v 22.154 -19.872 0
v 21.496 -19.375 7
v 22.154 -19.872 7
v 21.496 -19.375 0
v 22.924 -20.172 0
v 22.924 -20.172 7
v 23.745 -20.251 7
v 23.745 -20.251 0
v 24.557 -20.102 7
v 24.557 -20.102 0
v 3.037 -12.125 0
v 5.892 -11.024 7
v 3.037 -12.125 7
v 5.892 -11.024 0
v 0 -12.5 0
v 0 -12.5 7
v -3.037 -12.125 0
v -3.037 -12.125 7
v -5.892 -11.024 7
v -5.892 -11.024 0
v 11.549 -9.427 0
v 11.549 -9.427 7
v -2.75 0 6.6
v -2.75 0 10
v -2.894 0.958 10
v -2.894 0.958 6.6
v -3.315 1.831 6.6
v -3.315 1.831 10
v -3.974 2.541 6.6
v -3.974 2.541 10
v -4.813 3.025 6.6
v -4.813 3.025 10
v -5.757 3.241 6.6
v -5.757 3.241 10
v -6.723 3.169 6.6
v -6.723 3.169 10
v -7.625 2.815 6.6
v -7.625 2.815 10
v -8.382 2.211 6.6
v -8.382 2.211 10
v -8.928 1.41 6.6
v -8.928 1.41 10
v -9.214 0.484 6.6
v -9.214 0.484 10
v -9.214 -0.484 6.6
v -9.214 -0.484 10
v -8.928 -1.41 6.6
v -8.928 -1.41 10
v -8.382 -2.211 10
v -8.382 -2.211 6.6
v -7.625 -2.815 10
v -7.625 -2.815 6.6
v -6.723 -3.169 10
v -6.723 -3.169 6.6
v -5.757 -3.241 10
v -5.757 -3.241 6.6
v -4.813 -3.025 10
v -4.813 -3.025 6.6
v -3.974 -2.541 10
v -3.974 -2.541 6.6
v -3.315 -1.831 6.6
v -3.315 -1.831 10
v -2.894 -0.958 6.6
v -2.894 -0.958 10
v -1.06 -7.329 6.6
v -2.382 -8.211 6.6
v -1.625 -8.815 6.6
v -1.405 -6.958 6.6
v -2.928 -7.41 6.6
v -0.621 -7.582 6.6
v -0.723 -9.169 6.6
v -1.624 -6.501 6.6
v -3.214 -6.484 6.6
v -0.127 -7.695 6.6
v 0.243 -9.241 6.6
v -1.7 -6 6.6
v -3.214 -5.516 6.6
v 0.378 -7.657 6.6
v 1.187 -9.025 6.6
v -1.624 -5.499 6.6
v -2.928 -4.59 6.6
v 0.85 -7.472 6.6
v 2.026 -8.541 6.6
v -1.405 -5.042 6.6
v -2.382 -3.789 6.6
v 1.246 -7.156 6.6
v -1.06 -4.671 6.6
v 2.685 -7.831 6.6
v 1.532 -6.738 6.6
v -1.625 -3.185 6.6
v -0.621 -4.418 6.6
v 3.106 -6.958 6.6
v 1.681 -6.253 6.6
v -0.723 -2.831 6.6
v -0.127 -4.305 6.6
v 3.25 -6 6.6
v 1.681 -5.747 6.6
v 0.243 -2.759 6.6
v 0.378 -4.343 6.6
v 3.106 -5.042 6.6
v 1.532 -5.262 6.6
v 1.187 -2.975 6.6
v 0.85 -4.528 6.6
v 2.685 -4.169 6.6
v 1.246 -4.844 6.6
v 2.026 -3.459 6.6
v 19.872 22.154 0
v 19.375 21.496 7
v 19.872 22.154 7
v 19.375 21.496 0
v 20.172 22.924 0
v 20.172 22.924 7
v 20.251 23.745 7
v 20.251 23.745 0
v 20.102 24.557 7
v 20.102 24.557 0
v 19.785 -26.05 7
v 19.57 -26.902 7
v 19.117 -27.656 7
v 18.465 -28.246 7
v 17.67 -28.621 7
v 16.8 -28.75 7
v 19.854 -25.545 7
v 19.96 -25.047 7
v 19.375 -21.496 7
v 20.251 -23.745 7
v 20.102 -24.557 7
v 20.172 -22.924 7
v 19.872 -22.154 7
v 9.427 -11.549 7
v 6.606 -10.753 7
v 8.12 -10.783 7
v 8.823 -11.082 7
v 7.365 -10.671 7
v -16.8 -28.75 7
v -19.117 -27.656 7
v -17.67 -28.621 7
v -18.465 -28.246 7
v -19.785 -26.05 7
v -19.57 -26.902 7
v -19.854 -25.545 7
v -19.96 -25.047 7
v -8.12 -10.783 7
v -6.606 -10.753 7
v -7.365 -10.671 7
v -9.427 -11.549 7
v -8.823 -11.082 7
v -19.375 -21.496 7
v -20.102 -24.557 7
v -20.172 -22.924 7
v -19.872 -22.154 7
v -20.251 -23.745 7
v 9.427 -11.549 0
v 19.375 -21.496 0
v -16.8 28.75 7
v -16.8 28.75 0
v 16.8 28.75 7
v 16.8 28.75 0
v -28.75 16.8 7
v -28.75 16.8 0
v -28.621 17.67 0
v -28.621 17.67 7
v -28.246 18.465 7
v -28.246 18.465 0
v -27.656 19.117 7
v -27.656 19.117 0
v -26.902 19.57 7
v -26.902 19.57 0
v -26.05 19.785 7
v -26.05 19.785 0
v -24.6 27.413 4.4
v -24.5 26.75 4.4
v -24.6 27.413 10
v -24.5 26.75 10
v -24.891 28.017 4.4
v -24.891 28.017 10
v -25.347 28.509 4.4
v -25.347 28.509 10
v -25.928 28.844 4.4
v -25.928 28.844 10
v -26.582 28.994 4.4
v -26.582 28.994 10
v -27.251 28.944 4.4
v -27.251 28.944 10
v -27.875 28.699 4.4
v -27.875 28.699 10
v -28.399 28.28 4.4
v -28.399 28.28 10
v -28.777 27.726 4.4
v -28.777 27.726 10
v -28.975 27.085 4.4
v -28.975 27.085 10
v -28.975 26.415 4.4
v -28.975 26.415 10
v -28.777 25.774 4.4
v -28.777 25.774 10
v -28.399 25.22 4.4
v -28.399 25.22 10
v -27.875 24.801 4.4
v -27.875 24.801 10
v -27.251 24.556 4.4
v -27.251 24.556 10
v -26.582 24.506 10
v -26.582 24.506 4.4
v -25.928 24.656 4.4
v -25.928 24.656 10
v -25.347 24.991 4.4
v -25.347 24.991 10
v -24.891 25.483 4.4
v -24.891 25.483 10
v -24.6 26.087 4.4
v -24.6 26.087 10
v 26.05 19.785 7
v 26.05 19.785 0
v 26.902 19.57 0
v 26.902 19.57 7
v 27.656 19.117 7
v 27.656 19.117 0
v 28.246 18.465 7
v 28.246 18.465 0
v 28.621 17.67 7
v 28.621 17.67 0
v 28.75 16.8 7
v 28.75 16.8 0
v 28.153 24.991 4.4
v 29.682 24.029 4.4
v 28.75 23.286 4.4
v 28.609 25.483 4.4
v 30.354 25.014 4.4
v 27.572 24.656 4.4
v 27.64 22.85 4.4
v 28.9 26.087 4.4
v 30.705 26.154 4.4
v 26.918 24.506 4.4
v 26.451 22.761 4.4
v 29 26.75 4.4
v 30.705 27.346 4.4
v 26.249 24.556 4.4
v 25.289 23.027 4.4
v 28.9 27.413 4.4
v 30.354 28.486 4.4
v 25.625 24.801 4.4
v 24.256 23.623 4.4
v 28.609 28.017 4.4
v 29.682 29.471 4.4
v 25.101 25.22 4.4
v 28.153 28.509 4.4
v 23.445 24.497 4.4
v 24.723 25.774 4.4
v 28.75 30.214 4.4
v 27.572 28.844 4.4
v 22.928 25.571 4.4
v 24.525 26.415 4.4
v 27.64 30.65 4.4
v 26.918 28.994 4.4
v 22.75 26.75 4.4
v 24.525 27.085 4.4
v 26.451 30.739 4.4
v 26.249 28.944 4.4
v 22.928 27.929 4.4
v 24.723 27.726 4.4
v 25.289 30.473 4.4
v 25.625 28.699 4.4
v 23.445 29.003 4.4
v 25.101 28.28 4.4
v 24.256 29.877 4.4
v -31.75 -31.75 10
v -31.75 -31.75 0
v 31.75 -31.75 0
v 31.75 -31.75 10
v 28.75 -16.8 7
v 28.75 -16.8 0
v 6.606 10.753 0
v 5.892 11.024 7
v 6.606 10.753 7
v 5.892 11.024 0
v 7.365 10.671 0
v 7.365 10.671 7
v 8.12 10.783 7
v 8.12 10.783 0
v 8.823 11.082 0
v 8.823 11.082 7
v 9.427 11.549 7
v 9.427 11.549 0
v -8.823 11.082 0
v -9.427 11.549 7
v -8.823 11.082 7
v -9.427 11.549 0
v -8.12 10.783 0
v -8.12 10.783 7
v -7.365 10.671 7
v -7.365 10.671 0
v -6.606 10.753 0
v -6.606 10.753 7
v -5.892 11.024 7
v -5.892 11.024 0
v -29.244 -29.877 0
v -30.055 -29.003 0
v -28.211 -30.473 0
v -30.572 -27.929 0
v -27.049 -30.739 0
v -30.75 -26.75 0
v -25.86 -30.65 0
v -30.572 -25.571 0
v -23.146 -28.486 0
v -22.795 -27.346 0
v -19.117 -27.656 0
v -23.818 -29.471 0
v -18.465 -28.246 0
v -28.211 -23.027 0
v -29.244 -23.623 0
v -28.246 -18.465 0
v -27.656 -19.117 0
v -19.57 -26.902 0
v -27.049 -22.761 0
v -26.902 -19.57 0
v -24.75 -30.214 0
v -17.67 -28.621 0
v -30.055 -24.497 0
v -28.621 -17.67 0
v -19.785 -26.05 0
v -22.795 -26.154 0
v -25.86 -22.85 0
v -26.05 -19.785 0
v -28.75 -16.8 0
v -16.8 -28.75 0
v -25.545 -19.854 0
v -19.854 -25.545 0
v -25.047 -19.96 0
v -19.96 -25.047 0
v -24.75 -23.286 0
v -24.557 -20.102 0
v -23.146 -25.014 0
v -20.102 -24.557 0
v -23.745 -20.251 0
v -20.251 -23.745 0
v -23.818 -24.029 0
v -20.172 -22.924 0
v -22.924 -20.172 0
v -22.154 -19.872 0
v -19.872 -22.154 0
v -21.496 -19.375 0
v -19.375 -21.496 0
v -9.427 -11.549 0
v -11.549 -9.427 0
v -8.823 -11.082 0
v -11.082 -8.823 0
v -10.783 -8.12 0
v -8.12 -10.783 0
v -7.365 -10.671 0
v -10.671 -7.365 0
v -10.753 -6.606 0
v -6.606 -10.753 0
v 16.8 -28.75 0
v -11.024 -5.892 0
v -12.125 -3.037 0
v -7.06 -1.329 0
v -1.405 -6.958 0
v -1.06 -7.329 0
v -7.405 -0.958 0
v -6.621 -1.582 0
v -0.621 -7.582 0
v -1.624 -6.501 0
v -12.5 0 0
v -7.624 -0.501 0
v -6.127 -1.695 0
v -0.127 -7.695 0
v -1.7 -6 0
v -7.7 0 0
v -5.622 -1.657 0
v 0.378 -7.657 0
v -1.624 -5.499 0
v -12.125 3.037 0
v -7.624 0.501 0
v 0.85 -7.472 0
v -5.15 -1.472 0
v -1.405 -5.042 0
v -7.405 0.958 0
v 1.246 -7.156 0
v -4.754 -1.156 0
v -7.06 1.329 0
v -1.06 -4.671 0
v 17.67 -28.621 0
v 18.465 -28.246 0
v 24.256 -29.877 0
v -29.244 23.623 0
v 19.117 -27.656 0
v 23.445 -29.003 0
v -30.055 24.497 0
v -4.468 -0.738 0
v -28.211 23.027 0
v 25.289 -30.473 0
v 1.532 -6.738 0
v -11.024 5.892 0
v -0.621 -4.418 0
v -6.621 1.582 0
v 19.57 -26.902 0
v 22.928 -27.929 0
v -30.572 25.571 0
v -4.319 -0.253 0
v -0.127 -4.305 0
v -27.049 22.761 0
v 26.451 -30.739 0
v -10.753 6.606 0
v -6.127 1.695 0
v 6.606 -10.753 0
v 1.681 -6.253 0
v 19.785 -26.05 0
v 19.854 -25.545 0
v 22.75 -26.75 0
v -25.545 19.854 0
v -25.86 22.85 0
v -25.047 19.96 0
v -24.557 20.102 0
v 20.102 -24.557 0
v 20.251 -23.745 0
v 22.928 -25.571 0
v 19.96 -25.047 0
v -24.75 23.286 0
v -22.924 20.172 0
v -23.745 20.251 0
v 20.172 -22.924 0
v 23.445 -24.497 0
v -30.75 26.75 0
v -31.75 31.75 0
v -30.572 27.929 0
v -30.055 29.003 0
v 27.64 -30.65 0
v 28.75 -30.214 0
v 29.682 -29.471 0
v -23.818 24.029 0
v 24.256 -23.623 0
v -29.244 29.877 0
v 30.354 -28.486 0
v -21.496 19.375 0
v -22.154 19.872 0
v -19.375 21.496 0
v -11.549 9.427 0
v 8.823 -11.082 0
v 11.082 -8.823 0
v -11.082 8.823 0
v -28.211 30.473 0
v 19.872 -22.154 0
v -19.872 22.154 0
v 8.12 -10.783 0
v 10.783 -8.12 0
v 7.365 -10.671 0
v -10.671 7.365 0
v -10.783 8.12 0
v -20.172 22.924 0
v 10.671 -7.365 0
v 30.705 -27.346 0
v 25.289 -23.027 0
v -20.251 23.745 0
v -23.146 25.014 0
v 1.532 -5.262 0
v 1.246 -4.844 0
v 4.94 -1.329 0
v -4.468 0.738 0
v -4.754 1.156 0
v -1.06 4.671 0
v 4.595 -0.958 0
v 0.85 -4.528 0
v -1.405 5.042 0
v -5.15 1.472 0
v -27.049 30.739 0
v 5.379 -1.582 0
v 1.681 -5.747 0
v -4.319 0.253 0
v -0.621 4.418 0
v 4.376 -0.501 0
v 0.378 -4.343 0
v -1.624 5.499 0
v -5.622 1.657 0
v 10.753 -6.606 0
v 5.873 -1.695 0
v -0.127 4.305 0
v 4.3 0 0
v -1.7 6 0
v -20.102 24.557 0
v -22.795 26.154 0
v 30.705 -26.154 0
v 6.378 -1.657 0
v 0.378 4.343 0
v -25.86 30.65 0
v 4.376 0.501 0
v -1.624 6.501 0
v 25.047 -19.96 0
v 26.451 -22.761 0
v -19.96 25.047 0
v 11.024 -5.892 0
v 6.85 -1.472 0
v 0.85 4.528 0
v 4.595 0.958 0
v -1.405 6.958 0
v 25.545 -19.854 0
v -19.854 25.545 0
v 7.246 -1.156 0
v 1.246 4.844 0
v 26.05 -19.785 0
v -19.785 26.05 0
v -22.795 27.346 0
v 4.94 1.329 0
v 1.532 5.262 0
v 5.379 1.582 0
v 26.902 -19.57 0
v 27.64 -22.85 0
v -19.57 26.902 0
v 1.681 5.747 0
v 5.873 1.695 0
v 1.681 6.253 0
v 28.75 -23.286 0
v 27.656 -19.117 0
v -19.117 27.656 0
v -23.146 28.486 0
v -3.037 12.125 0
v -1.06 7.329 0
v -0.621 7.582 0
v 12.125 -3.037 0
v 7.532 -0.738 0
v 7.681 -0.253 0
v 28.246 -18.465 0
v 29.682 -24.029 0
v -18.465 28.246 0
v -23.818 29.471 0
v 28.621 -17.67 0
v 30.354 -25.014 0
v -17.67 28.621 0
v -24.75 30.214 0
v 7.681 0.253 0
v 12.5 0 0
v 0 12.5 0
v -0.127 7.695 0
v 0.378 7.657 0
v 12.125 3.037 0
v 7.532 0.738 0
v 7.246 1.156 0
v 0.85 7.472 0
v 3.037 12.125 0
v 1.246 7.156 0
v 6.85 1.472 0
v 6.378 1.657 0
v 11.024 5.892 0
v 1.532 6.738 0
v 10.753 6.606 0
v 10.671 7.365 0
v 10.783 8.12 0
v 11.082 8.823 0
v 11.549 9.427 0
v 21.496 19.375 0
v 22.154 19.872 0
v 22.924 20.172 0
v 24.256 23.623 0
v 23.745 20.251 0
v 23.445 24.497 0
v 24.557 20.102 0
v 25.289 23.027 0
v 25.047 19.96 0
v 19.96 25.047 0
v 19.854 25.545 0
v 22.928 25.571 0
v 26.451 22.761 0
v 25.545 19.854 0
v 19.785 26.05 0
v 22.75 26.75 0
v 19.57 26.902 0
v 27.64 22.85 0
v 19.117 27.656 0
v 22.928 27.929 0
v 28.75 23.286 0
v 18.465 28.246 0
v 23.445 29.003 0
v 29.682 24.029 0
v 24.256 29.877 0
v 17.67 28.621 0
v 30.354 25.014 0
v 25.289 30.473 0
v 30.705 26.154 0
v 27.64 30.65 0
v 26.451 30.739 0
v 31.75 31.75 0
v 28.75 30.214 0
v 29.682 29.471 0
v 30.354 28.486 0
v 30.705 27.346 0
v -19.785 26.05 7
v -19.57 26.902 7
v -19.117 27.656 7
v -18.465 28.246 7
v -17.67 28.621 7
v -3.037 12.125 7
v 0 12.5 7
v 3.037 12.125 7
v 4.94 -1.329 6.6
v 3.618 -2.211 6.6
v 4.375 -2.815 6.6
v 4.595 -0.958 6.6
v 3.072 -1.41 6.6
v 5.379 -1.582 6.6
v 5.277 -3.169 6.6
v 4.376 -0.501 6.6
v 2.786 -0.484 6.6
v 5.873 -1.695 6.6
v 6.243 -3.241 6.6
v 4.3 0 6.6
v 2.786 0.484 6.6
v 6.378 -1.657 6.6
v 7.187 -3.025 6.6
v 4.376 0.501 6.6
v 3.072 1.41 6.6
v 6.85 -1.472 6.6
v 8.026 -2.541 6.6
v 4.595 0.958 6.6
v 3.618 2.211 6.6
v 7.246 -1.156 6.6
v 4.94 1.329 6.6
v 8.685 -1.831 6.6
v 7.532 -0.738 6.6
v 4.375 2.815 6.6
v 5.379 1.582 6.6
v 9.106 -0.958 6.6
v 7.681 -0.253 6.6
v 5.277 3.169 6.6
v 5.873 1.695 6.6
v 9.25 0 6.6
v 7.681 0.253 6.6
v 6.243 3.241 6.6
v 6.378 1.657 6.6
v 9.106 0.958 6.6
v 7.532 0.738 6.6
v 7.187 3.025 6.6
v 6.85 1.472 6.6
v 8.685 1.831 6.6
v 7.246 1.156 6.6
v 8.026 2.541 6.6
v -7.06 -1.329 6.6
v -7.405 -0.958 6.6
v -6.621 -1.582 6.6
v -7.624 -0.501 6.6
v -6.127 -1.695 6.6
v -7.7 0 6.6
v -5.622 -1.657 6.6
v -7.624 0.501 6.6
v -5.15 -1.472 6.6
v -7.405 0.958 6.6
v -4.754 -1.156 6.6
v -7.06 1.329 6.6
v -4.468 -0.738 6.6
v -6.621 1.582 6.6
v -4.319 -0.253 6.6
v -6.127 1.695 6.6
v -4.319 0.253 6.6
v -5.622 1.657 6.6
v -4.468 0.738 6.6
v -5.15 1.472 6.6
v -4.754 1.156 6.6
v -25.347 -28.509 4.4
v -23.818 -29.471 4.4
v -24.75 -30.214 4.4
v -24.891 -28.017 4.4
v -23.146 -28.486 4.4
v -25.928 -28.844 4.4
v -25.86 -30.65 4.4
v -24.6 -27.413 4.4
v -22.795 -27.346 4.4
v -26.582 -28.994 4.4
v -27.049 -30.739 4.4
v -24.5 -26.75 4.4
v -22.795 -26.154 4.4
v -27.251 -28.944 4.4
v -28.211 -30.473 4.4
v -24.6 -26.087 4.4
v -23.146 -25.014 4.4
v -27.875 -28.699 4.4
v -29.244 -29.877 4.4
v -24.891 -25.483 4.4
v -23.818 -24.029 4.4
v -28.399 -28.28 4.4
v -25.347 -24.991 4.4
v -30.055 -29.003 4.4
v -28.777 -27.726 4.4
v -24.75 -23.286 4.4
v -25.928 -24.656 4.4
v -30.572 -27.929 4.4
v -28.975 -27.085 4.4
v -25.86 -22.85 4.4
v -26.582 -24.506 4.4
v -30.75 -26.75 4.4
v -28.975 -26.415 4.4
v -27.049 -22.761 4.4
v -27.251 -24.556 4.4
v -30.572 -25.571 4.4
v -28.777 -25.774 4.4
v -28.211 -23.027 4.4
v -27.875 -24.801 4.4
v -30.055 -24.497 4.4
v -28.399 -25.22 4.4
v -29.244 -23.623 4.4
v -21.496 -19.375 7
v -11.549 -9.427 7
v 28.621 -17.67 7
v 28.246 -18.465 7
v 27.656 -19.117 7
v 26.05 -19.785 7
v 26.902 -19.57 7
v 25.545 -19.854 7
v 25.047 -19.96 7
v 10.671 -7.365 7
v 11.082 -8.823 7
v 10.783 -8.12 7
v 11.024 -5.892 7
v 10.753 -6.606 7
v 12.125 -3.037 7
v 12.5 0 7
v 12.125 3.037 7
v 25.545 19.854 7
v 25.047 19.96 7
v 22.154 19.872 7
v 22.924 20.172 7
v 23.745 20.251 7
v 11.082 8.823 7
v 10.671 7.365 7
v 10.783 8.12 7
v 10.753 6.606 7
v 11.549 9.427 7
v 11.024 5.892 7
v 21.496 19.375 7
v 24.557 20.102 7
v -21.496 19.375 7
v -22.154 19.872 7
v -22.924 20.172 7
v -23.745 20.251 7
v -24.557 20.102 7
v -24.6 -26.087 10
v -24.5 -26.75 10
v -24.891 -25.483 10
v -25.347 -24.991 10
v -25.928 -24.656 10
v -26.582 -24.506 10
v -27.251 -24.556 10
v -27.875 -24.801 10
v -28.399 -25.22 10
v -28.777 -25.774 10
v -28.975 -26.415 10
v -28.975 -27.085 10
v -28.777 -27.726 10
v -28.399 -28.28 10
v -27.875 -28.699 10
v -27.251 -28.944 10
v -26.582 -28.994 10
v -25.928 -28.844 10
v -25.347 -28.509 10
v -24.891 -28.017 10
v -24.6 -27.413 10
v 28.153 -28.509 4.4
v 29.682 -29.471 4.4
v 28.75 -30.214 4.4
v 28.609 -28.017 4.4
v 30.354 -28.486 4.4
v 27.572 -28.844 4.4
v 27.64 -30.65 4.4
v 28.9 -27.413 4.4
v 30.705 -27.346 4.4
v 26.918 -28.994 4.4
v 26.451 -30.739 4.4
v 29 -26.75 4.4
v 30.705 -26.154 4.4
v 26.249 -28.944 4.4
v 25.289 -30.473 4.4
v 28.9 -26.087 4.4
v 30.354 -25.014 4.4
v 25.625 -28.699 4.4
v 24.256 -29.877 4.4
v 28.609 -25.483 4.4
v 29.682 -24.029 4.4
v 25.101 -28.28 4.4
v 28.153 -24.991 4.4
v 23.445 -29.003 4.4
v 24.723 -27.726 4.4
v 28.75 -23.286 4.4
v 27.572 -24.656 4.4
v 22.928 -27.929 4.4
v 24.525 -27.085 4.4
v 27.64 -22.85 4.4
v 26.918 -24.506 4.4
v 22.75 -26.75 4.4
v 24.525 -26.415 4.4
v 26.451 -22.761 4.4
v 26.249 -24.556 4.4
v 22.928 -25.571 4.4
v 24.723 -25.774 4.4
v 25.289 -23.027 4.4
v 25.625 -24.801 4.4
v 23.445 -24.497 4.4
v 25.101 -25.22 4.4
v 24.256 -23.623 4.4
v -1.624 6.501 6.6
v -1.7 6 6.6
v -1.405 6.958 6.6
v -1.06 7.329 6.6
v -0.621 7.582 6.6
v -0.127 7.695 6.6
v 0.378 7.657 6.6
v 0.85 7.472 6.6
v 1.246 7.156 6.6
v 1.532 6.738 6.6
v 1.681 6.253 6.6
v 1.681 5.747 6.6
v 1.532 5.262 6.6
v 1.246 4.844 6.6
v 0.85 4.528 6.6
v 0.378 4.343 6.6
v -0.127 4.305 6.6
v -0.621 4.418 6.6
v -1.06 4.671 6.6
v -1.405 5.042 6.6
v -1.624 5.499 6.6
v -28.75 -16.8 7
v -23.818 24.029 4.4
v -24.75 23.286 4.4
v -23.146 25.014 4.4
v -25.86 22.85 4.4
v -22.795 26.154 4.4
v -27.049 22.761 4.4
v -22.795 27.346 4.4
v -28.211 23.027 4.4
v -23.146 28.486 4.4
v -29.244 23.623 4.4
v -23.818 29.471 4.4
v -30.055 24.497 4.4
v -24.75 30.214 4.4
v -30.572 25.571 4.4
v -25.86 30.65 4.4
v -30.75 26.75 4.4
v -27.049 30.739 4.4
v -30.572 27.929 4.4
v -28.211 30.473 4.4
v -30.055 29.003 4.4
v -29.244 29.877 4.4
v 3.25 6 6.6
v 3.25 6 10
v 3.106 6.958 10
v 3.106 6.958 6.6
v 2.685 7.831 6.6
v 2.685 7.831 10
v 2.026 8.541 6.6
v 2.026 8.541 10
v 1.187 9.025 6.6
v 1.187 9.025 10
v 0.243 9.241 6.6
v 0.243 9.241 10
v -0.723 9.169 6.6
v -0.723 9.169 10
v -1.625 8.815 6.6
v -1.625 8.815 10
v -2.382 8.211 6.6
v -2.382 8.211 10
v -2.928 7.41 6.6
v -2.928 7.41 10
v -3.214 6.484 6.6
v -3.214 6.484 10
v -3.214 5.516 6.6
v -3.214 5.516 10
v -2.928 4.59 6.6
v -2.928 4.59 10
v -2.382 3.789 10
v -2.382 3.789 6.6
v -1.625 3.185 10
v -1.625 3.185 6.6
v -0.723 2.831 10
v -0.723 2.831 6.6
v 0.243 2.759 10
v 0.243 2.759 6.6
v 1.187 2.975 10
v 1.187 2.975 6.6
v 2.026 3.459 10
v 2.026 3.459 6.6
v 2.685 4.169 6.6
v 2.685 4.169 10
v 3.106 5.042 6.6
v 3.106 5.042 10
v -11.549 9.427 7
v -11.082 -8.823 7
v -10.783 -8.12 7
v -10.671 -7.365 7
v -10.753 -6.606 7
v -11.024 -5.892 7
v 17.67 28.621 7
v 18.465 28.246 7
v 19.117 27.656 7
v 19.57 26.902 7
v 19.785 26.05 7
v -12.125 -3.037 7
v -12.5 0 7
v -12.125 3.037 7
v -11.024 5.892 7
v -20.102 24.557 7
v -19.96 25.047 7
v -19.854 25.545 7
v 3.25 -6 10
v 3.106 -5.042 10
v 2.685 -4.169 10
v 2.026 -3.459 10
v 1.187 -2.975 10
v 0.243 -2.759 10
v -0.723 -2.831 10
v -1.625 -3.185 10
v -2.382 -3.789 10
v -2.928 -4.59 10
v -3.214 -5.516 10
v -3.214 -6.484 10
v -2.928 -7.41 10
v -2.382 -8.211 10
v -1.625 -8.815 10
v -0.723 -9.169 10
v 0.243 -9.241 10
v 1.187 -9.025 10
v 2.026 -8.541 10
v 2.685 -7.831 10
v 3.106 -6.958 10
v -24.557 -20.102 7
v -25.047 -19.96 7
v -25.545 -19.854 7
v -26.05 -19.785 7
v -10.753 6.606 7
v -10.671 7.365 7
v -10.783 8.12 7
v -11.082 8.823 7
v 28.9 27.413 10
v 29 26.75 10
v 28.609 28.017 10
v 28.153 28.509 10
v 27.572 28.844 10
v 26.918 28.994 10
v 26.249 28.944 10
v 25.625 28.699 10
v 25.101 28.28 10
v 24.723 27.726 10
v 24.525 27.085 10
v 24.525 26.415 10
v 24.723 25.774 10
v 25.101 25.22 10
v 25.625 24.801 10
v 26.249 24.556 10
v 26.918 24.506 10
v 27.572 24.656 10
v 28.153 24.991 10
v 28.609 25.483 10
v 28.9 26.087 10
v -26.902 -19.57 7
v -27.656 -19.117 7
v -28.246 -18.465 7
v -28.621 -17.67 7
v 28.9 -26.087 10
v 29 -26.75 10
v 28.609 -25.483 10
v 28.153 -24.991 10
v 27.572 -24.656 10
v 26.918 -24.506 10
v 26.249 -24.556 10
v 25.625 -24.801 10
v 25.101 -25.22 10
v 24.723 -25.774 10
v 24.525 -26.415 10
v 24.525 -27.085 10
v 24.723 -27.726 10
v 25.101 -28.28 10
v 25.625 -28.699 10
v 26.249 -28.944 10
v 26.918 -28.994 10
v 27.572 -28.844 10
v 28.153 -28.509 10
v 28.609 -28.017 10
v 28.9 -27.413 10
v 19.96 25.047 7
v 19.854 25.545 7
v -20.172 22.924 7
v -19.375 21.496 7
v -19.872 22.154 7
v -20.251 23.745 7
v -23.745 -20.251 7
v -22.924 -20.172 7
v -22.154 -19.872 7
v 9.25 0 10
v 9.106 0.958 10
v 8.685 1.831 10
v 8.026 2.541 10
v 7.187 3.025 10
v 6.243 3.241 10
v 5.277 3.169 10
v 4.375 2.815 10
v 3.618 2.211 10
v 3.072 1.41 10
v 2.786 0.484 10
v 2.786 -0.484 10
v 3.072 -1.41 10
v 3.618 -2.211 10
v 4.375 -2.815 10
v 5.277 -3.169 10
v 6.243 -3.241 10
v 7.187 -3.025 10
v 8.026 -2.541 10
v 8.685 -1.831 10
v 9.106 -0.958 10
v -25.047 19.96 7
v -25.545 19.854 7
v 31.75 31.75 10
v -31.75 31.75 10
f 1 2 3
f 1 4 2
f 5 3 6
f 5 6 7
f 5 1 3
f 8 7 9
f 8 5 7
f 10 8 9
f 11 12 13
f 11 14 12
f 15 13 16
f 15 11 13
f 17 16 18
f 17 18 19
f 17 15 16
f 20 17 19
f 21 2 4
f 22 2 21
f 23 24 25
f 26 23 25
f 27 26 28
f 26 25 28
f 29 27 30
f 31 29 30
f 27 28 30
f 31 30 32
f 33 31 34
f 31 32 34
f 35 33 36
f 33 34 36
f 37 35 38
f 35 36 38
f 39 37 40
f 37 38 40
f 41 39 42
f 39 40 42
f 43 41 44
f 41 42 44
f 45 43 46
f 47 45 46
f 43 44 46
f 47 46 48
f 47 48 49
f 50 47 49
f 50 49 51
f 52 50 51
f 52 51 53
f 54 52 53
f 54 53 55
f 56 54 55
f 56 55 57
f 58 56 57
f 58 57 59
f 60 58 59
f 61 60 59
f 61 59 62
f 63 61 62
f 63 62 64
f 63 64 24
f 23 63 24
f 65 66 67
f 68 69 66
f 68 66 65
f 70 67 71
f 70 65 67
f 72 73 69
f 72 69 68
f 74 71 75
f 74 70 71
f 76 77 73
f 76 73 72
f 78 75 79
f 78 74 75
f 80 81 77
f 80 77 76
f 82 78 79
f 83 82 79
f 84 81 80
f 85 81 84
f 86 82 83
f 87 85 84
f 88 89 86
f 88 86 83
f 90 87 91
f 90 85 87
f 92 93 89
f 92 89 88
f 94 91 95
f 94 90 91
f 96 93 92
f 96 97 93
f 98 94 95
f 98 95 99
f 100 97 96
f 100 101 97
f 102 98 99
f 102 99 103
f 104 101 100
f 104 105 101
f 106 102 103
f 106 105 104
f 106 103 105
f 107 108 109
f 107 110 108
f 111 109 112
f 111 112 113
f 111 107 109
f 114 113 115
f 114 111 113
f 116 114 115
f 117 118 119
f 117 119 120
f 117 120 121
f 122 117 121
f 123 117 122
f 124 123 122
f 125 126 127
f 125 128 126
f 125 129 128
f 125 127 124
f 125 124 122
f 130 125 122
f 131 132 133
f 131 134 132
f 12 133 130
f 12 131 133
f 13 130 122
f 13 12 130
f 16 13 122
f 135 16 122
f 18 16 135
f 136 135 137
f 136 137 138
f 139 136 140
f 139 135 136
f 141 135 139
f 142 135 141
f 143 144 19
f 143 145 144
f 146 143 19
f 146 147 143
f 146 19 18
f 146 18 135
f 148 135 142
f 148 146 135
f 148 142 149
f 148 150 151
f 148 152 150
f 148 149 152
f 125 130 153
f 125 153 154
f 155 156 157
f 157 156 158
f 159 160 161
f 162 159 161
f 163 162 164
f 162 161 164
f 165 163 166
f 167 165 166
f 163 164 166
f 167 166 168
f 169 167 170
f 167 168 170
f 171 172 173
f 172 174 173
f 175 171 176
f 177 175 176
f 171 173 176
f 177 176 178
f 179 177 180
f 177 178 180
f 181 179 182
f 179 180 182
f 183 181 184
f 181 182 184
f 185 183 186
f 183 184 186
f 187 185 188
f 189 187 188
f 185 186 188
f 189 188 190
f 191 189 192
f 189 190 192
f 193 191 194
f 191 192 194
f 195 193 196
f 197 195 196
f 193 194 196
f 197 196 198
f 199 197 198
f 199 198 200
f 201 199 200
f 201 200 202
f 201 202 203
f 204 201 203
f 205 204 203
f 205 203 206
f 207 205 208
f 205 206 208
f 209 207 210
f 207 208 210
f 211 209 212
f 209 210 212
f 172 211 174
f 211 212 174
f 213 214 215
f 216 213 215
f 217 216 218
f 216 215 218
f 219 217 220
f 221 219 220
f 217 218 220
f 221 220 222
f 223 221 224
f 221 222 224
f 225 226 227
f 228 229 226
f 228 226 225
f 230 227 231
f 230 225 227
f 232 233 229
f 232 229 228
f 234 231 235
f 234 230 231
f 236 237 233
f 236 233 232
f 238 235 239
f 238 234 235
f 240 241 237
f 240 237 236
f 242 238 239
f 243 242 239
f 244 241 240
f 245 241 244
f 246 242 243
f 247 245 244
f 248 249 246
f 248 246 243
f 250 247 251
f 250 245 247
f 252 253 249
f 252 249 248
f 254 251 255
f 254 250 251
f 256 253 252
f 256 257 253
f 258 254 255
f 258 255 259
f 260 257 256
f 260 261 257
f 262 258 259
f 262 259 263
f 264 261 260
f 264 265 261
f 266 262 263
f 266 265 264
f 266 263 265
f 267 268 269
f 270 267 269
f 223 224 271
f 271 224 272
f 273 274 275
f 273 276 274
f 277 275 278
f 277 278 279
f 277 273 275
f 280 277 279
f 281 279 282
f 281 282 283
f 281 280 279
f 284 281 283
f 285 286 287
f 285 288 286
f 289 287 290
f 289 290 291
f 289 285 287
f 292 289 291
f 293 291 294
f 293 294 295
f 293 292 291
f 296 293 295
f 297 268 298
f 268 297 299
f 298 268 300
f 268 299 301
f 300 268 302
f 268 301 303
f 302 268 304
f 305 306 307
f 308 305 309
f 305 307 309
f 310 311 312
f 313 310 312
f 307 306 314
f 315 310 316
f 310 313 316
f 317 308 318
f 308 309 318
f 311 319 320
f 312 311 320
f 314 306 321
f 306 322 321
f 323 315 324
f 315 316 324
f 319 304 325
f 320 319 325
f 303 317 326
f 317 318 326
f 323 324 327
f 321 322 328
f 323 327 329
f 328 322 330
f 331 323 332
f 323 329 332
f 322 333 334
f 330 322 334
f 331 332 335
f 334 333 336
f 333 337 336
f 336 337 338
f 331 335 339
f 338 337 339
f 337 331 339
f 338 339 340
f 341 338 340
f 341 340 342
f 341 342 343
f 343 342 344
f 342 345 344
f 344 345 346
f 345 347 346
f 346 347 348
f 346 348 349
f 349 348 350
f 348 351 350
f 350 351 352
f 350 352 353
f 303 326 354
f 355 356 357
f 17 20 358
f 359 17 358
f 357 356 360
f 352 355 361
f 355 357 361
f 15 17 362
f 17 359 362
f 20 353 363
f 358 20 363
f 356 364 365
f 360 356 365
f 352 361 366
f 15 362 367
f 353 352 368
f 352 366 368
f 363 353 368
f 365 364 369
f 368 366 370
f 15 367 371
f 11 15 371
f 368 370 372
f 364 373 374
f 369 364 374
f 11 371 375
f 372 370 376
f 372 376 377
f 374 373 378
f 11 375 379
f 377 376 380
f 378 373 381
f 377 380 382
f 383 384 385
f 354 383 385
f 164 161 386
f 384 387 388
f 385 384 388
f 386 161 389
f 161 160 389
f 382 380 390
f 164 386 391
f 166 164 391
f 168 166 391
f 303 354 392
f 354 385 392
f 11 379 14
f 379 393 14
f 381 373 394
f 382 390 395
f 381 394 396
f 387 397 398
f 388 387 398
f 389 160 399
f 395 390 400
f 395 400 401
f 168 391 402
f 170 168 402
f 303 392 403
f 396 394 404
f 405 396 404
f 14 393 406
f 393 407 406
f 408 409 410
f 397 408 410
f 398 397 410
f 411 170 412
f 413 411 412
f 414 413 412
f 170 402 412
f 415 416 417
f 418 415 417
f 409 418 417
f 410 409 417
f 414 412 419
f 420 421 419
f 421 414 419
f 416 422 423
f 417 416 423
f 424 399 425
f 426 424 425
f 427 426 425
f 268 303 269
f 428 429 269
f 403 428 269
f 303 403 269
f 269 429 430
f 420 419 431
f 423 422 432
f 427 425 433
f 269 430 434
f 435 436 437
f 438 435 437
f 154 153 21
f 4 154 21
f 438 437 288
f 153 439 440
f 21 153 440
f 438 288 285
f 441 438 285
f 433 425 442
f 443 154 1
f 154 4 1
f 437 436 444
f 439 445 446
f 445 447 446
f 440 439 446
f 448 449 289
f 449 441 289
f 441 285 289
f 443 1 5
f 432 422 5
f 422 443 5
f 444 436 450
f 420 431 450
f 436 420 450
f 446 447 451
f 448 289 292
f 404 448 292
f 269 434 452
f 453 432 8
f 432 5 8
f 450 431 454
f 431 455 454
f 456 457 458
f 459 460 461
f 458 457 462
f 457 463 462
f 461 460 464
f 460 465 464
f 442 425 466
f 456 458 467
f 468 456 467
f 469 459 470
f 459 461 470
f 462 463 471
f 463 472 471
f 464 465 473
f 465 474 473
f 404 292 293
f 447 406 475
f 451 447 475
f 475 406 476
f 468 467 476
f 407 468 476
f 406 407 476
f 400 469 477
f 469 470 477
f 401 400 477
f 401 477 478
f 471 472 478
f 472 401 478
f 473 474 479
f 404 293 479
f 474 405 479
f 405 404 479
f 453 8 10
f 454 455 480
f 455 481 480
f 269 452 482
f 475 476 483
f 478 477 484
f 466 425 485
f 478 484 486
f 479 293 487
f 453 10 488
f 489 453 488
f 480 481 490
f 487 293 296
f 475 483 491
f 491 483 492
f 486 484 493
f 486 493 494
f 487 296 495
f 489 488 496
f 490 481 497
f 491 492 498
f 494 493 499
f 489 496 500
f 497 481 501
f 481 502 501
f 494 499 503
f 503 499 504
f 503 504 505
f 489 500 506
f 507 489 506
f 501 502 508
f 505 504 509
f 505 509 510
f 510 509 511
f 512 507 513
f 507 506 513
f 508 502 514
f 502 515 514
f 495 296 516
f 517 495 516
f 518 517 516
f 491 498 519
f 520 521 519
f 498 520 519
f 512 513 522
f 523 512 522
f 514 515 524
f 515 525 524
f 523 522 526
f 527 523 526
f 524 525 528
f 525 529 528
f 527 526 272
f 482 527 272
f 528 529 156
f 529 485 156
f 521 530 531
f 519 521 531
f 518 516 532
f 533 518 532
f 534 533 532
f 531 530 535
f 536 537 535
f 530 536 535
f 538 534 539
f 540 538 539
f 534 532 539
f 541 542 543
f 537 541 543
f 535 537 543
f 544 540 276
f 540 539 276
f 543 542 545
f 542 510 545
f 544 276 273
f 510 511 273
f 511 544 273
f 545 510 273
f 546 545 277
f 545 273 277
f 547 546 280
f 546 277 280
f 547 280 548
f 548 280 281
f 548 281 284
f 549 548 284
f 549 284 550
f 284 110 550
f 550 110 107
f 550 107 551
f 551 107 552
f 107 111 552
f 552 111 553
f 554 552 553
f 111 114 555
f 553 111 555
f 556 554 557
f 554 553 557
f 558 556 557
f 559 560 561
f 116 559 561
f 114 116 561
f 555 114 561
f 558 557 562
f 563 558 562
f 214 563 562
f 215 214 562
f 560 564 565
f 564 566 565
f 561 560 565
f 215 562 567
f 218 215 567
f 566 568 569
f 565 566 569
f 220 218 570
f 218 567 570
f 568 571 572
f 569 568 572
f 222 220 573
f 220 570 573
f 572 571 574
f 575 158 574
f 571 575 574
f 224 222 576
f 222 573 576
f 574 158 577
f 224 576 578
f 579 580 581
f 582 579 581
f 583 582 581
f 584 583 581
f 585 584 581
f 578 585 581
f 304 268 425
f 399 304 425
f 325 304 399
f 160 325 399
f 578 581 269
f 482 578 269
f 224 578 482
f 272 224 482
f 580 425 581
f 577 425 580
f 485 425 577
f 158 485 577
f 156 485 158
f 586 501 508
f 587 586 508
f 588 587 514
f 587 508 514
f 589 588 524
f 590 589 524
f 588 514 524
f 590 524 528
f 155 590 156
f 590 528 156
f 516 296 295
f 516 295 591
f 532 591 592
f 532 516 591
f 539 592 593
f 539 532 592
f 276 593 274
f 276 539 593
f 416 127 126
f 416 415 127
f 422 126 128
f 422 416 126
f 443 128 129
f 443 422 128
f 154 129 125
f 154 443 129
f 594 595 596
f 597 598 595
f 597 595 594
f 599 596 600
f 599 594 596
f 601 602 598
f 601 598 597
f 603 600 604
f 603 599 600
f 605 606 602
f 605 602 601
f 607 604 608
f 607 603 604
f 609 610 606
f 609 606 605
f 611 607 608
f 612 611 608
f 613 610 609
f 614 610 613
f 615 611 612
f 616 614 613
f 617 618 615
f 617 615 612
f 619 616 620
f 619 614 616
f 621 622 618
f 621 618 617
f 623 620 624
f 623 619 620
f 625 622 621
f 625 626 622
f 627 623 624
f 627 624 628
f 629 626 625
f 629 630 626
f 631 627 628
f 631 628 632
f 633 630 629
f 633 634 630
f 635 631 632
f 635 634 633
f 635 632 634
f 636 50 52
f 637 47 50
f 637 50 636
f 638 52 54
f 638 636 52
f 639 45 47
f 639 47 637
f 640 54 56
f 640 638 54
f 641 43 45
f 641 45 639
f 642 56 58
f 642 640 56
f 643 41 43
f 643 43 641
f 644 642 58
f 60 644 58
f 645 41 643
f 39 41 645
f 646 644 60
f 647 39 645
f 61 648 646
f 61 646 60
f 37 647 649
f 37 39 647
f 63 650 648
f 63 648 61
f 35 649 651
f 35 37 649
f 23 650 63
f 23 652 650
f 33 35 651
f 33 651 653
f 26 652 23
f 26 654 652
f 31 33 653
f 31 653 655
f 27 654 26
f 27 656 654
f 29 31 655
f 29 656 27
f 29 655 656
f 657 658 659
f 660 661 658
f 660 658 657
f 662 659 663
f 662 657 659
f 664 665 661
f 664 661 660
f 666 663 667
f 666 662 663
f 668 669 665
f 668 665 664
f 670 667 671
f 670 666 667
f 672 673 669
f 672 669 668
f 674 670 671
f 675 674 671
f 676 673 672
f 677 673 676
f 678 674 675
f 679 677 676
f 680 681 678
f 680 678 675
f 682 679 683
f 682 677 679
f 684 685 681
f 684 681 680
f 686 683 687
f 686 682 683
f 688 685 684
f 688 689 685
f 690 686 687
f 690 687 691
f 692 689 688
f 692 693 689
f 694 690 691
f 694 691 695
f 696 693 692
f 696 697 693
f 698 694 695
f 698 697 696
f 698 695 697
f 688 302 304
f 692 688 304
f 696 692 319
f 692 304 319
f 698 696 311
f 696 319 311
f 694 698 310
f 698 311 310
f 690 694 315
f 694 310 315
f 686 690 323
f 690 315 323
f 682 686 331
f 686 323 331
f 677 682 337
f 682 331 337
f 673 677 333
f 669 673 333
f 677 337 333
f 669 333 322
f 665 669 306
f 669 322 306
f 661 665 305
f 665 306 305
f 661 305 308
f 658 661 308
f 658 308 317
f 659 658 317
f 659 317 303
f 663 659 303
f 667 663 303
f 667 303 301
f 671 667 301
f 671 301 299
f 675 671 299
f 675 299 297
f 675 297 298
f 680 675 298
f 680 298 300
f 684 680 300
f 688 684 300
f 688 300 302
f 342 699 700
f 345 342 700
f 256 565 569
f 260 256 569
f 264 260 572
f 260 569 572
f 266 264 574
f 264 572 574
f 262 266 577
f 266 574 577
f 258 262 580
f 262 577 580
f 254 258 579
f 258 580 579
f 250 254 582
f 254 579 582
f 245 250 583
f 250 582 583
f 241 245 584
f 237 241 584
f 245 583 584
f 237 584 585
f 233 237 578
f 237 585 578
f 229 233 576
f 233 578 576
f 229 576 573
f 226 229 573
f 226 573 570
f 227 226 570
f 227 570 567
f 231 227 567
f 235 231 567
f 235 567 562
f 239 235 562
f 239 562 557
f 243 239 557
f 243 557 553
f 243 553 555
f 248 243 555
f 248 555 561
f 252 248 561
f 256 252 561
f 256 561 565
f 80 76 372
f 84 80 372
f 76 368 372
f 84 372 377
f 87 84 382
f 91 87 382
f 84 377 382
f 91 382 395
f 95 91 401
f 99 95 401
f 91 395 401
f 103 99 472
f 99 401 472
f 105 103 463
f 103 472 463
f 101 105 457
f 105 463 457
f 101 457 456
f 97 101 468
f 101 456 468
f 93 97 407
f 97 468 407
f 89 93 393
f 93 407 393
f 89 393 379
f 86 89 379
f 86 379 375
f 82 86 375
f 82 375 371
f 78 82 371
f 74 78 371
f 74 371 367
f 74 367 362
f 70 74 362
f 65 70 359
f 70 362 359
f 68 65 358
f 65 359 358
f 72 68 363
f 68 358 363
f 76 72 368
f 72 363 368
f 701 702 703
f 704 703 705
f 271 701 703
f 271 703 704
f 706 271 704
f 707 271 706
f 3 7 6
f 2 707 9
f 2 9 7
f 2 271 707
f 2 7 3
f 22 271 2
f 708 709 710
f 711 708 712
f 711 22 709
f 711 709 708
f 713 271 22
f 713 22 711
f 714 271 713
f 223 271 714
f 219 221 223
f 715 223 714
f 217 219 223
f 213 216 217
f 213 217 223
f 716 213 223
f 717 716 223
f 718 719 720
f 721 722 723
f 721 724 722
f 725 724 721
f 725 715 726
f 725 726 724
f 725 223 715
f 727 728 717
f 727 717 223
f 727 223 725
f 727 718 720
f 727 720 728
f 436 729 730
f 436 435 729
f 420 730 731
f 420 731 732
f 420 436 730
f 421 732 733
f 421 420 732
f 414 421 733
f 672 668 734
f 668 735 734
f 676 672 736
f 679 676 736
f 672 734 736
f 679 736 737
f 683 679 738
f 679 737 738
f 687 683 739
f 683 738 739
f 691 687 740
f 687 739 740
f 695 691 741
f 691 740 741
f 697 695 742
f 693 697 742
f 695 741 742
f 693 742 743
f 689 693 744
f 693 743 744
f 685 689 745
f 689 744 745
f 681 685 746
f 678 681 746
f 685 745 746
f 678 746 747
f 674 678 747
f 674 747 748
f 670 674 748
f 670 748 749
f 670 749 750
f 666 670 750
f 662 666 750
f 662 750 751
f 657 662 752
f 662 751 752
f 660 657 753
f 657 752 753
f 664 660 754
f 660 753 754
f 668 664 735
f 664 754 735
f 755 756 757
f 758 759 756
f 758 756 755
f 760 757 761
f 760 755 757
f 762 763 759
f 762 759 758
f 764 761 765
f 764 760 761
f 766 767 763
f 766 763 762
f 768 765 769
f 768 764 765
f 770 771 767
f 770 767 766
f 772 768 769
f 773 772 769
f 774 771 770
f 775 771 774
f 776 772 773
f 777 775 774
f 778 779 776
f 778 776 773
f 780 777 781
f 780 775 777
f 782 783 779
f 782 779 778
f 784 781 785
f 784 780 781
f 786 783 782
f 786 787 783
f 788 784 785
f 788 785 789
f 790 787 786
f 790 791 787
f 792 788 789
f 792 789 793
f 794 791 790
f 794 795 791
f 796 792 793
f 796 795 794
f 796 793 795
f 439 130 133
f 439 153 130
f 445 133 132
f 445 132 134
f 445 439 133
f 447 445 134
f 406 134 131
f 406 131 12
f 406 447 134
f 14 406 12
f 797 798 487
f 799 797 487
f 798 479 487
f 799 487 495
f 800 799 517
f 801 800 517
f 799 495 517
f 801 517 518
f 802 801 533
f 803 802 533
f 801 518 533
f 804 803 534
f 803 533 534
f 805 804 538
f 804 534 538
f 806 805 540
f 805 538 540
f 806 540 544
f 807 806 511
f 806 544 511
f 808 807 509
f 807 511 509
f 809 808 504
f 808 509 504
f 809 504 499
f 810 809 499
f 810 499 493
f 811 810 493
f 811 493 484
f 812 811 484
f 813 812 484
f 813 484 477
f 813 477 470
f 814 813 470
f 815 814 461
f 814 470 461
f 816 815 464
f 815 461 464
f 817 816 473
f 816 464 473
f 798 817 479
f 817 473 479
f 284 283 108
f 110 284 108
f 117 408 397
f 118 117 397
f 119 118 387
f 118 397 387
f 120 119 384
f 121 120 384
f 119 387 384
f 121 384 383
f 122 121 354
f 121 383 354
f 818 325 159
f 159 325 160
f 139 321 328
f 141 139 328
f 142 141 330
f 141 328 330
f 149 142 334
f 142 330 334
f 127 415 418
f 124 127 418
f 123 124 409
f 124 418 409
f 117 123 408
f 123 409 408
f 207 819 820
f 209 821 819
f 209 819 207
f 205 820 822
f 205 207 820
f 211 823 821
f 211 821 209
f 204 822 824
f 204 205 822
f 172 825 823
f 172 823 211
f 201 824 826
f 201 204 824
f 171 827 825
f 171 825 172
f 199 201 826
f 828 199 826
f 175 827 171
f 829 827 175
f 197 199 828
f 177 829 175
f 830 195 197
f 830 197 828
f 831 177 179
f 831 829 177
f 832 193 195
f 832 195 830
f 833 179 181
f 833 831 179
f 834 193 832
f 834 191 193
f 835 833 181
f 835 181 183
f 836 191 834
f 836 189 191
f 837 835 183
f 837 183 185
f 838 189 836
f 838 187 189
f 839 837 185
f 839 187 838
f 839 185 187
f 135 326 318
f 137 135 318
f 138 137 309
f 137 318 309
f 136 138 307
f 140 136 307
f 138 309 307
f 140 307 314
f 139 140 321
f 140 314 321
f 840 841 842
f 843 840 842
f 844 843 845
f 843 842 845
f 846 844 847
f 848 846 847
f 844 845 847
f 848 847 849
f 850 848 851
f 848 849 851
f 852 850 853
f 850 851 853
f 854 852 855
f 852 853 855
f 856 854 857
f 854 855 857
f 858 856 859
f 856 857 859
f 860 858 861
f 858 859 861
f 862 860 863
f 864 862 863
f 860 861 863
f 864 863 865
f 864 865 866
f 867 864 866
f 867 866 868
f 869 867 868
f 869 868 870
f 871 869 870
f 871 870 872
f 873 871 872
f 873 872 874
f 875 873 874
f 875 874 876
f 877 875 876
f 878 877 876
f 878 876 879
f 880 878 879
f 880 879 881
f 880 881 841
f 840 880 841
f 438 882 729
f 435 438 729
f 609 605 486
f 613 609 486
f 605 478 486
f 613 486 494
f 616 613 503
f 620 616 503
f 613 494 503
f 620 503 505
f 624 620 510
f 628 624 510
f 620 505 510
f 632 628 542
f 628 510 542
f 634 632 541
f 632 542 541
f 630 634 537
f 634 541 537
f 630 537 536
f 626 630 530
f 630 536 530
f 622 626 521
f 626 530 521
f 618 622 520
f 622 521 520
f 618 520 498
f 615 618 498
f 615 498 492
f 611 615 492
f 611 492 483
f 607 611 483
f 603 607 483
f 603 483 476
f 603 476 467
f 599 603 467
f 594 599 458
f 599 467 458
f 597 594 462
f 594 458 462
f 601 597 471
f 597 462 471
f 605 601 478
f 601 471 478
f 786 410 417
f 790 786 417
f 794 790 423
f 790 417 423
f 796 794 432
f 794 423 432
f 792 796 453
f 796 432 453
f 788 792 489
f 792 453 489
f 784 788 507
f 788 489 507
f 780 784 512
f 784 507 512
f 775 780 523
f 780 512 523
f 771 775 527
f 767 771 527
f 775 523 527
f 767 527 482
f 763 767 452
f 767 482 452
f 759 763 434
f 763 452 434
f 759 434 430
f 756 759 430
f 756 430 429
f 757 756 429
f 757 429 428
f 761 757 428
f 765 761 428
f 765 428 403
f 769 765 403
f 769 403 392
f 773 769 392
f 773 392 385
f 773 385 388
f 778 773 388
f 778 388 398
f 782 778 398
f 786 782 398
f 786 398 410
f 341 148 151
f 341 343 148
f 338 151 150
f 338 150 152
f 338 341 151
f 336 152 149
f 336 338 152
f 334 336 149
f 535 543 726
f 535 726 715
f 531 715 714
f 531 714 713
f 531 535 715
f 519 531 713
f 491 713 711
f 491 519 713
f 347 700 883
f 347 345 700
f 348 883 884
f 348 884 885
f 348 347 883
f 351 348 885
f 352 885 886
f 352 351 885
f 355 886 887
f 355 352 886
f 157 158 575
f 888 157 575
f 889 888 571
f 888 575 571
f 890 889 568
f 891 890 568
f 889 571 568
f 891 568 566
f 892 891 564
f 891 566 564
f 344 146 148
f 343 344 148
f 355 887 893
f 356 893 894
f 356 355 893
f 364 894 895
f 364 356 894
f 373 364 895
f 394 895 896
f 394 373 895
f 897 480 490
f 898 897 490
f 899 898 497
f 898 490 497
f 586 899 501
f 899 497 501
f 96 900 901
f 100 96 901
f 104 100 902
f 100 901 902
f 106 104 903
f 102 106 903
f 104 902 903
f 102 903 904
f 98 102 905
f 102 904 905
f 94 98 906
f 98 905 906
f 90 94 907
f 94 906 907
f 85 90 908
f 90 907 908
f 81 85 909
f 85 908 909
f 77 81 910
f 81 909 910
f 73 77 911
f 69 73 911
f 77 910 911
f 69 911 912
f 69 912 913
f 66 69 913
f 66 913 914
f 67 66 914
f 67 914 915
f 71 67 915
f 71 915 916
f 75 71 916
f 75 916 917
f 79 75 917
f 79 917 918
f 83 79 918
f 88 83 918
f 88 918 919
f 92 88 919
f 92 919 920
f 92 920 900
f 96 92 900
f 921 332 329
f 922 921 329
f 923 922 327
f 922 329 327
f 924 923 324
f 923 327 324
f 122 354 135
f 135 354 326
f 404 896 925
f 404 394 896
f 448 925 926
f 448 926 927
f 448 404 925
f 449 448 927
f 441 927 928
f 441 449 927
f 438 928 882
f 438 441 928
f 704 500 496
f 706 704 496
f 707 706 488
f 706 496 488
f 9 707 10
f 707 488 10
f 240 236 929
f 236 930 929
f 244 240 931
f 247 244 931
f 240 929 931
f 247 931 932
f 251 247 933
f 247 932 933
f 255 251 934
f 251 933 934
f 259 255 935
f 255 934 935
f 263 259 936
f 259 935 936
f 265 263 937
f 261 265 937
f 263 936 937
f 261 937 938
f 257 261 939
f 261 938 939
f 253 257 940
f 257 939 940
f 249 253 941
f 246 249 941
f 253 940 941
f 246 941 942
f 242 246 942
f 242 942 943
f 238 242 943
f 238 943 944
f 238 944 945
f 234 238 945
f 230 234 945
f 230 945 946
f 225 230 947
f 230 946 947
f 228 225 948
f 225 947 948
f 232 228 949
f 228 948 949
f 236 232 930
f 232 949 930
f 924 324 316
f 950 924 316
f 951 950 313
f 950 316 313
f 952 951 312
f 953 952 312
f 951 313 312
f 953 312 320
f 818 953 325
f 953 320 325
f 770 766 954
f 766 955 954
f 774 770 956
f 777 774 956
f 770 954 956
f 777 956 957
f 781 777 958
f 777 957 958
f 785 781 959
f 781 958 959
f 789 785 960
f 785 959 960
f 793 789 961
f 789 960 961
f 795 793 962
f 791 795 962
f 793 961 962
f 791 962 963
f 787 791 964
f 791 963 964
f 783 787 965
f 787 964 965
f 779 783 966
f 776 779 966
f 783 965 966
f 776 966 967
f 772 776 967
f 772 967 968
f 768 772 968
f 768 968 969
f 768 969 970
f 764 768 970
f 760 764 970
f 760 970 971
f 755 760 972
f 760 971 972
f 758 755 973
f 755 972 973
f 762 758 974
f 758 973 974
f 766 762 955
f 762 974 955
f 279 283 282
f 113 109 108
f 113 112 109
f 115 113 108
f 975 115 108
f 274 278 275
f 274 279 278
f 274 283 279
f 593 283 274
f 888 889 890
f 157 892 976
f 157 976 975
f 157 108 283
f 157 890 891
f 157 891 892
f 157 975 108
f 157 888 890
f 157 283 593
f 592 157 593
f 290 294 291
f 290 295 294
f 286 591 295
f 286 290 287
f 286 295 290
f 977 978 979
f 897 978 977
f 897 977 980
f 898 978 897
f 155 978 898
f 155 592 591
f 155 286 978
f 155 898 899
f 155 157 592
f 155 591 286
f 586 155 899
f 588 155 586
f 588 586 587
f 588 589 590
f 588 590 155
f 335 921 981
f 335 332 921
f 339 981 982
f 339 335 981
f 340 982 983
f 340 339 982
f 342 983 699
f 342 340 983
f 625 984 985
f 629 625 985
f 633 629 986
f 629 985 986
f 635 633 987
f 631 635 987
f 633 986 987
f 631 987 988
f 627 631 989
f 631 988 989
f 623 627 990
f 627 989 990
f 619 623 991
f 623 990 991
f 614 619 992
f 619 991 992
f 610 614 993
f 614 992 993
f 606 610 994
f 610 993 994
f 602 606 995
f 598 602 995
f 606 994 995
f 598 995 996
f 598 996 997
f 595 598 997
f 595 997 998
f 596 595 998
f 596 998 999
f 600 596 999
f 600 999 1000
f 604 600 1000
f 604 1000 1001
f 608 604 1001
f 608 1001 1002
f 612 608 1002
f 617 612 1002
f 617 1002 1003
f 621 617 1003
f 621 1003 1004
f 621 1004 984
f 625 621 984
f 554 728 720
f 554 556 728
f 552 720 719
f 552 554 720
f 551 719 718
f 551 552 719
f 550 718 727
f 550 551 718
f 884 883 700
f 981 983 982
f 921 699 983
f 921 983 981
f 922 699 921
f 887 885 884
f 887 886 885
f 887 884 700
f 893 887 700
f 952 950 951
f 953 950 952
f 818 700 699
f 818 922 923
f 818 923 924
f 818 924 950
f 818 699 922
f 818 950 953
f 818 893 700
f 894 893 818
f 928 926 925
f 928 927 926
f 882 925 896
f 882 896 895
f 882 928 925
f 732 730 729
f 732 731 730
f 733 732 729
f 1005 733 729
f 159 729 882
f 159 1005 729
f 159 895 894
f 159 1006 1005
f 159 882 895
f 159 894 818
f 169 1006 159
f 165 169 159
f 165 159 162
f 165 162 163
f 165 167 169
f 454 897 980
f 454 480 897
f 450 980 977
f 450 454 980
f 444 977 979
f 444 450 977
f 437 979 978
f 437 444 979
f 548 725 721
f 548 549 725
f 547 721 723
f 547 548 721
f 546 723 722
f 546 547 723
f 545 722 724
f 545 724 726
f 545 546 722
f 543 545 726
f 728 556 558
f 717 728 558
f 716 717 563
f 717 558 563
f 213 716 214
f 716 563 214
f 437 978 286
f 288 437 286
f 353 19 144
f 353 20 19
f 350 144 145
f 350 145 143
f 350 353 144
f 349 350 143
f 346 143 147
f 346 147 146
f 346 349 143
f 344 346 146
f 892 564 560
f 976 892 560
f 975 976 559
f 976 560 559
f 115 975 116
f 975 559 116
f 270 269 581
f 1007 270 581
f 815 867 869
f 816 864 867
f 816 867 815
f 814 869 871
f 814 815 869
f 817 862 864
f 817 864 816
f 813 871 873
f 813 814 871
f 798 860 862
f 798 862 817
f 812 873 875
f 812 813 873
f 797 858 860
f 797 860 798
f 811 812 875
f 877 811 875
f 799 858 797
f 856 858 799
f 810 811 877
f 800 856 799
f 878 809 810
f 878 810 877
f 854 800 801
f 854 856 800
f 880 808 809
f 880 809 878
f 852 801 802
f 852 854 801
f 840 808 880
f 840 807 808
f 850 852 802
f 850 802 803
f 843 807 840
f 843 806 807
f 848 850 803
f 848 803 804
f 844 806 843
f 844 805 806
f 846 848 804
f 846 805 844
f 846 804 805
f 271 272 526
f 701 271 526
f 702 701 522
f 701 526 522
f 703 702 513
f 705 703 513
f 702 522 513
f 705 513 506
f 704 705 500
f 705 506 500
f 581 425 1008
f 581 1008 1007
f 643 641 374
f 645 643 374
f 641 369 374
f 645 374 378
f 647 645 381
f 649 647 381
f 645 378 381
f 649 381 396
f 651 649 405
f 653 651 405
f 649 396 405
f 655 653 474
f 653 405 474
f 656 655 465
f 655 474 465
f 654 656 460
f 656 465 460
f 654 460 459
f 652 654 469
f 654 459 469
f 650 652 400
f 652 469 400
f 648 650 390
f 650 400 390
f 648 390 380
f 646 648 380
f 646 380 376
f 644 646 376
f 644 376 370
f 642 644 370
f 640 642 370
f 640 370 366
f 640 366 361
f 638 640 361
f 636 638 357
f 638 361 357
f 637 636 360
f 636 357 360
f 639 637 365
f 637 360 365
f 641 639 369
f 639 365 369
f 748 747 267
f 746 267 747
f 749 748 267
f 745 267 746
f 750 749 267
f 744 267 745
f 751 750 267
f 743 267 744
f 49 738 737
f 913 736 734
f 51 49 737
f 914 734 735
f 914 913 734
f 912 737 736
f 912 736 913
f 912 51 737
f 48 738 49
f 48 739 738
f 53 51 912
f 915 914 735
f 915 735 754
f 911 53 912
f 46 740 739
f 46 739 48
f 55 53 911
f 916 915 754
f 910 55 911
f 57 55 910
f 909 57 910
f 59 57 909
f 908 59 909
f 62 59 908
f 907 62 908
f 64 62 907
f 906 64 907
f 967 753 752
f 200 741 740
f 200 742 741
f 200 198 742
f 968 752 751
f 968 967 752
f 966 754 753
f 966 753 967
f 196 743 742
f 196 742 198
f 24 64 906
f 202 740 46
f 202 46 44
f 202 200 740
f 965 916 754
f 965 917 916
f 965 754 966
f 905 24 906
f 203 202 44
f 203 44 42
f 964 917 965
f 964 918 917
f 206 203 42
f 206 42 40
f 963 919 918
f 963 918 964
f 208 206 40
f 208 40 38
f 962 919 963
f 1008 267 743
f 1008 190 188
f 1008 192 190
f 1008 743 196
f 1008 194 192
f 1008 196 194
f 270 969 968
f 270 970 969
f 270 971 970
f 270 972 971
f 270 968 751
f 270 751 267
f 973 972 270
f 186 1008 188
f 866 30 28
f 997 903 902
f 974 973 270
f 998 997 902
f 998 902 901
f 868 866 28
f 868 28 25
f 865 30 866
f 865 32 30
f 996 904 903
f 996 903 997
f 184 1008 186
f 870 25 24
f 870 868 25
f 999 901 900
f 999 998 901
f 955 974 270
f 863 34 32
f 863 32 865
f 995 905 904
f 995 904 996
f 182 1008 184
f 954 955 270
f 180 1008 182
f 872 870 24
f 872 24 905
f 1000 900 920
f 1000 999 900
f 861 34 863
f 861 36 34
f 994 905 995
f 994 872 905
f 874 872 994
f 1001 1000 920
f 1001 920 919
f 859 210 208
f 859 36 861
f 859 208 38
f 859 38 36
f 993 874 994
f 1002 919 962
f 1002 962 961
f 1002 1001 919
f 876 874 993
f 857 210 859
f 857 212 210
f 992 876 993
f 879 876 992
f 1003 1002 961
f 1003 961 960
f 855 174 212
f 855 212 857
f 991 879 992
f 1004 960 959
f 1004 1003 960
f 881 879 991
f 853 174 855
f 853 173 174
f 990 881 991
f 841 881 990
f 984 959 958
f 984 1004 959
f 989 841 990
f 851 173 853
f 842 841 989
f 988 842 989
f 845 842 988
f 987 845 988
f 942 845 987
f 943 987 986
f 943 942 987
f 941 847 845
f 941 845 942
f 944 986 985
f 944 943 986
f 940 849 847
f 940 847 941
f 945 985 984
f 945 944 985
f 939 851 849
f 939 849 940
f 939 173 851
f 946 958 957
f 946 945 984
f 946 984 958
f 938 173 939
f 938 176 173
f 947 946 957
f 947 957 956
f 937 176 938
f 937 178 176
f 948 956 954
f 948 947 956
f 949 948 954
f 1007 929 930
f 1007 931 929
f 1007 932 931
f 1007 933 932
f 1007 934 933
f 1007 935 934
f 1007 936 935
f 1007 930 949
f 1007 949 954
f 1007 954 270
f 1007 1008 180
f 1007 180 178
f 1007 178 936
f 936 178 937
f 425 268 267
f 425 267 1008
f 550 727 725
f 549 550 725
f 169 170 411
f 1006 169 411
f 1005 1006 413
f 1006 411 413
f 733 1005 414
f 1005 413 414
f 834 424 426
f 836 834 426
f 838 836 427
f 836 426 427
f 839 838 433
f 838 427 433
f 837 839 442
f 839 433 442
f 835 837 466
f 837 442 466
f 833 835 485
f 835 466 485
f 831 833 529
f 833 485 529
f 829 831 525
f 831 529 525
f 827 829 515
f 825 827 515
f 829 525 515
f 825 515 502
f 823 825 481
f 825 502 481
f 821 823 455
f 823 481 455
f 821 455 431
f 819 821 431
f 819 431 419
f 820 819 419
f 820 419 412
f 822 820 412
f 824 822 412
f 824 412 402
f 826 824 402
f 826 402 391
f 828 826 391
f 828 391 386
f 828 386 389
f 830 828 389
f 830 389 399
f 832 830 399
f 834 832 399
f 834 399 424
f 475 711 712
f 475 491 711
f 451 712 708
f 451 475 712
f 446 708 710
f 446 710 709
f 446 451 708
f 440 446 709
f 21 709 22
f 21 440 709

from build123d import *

# Parameters (mm, degrees)
SKETCH_1_W                  = 63.5
SKETCH_1_H                  = 63.5
EXTRUDE_1_DEPTH             = 10
HOLE_WIZARD_M31_D           = 3.4
HOLE_WIZARD_M31_CBORE_D     = 6.5
HOLE_WIZARD_M31_CBORE_DEPTH = 3.4
HOLE_WIZARD_M41_D           = 4.5
HOLE_WIZARD_M41_CBORE_D     = 8
HOLE_WIZARD_M41_CBORE_DEPTH = 4.4
SKETCH_8_R                  = 12.5
CUT_EXTRUDE_1_DEPTH         = 7
EXTRUDE_2_DEPTH             = 7
FILLET_1_R                  = 3


with BuildPart() as part:
    # Эскиз1 → Бобышка-Вытянуть1 (new body)
    with BuildSketch(Plane.XY):
        Rectangle(SKETCH_1_W, SKETCH_1_H)
    extrude(amount=EXTRUDE_1_DEPTH)

    # Цековка для винта с внутренним шестигранником M31 (through all)
    with Locations(Plane.XY.offset(10)):
        with Locations((0, 6), (-6, 0), (0, -6), (6, 0)):
            CounterBoreHole(HOLE_WIZARD_M31_D / 2, HOLE_WIZARD_M31_CBORE_D / 2, HOLE_WIZARD_M31_CBORE_DEPTH)

    # Цековка для винта с внутренним шестигранником M41 (through all)
    with Locations(Plane(origin=(0, 0, 0), x_dir=(-1, 0, 0), z_dir=(0, 0, -1))):
        with Locations((-26.75, 26.75), (-26.75, -26.75), (26.75, -26.75), (26.75, 26.75)):
            CounterBoreHole(HOLE_WIZARD_M41_D / 2, HOLE_WIZARD_M41_CBORE_D / 2, HOLE_WIZARD_M41_CBORE_DEPTH)

    # Эскиз8 → Вырез-Вытянуть1 (cut)
    with BuildSketch(Plane(origin=(0, 0, 0), x_dir=(-1, 0, 0), z_dir=(0, 0, -1))):
        with BuildLine():
            Line((-28.75, 16.800125629), (-28.75, -16.800125629))
            ThreePointArc((-28.75, -16.800125629), (-27.974859546, -18.812586809), (-26.05, -19.78508794))
            ThreePointArc((-26.05, -19.78508794), (-21.800252532, -21.800252532), (-19.78508794, -26.05))
            ThreePointArc((-19.78508794, -26.05), (-18.812586809, -27.974859546), (-16.800125629, -28.75))
            Line((-16.800125629, -28.75), (16.800125629, -28.75))
            ThreePointArc((16.800125629, -28.75), (18.812586809, -27.974859546), (19.78508794, -26.05))
            ThreePointArc((19.78508794, -26.05), (21.800252532, -21.800252532), (26.05, -19.78508794))
            ThreePointArc((26.05, -19.78508794), (27.974859546, -18.812586809), (28.75, -16.800125629))
            Line((28.75, -16.800125629), (28.75, 16.800125629))
            ThreePointArc((28.75, 16.800125629), (27.974859546, 18.812586809), (26.05, 19.78508794))
            ThreePointArc((26.05, 19.78508794), (21.800252532, 21.800252532), (19.78508794, 26.05))
            ThreePointArc((19.78508794, 26.05), (18.812586809, 27.974859546), (16.800125629, 28.75))
            Line((16.800125629, 28.75), (-16.800125629, 28.75))
            ThreePointArc((-16.800125629, 28.75), (-18.812586809, 27.974859546), (-19.78508794, 26.05))
            ThreePointArc((-19.78508794, 26.05), (-21.800252532, 21.800252532), (-26.05, 19.78508794))
            ThreePointArc((-26.05, 19.78508794), (-27.974859546, 18.812586809), (-28.75, 16.800125629))
        make_face()
        Circle(SKETCH_8_R, mode=Mode.SUBTRACT)
    extrude(amount=-CUT_EXTRUDE_1_DEPTH, mode=Mode.SUBTRACT)

    # Эскиз9 → Бобышка-Вытянуть2 (add)
    with BuildSketch(Plane(origin=(0, 0, 7), x_dir=(-1, 0, 0), z_dir=(0, 0, -1))):
        with BuildLine():
            Line((20.854569927, 22.97589027), (7.714304216, 9.835624559))
            ThreePointArc((7.714304216, 9.835624559), (8.838834765, 8.838834765), (9.835624559, 7.714304216))
            Line((9.835624559, 7.714304216), (22.97589027, 20.854569927))
            ThreePointArc((22.97589027, 20.854569927), (21.800252532, 21.800252532), (20.854569927, 22.97589027))
        make_face()
        with BuildLine():
            Line((-22.97589027, 20.854569927), (-9.835624559, 7.714304216))
            ThreePointArc((-9.835624559, 7.714304216), (-8.838834765, 8.838834765), (-7.714304216, 9.835624559))
            Line((-7.714304216, 9.835624559), (-20.854569927, 22.97589027))
            ThreePointArc((-20.854569927, 22.97589027), (-21.800252532, 21.800252532), (-22.97589027, 20.854569927))
        make_face()
        with BuildLine():
            Line((7.714304216, -9.835624559), (20.854569927, -22.97589027))
            ThreePointArc((20.854569927, -22.97589027), (21.800252532, -21.800252532), (22.97589027, -20.854569927))
            Line((22.97589027, -20.854569927), (9.835624559, -7.714304216))
            ThreePointArc((9.835624559, -7.714304216), (8.838834765, -8.838834765), (7.714304216, -9.835624559))
        make_face()
        with BuildLine():
            Line((-7.714304216, -9.835624559), (-20.854569927, -22.97589027))
            ThreePointArc((-20.854569927, -22.97589027), (-21.800252532, -21.800252532), (-22.97589027, -20.854569927))
            Line((-22.97589027, -20.854569927), (-9.835624559, -7.714304216))
            ThreePointArc((-9.835624559, -7.714304216), (-8.838834765, -8.838834765), (-7.714304216, -9.835624559))
        make_face()
    extrude(amount=EXTRUDE_2_DEPTH)

    # Скругление1
    fillet_1_edges = [part.edges().sort_by_distance(p)[0] for p in [
        (-20.854569927, 22.97589027, 3.5),
        (-22.97589027, 20.854569927, 3.5),
        (-9.835624559, 7.714304216, 3.5),
        (-7.714304216, 9.835624559, 3.5),
        (9.835624559, -7.714304216, 3.5),
        (7.714304216, -9.835624559, 3.5),
        (20.854569927, -22.97589027, 3.5),
        (22.97589027, -20.854569927, 3.5),
        (22.97589027, 20.854569927, 3.5),
        (20.854569927, 22.97589027, 3.5),
        (7.714304216, 9.835624559, 3.5),
        (9.835624559, 7.714304216, 3.5),
        (-7.714304216, -9.835624559, 3.5),
        (-9.835624559, -7.714304216, 3.5),
        (-22.97589027, -20.854569927, 3.5),
        (-20.854569927, -22.97589027, 3.5),
    ]]
    fillet(fillet_1_edges, radius=FILLET_1_R)


solid = part.part
